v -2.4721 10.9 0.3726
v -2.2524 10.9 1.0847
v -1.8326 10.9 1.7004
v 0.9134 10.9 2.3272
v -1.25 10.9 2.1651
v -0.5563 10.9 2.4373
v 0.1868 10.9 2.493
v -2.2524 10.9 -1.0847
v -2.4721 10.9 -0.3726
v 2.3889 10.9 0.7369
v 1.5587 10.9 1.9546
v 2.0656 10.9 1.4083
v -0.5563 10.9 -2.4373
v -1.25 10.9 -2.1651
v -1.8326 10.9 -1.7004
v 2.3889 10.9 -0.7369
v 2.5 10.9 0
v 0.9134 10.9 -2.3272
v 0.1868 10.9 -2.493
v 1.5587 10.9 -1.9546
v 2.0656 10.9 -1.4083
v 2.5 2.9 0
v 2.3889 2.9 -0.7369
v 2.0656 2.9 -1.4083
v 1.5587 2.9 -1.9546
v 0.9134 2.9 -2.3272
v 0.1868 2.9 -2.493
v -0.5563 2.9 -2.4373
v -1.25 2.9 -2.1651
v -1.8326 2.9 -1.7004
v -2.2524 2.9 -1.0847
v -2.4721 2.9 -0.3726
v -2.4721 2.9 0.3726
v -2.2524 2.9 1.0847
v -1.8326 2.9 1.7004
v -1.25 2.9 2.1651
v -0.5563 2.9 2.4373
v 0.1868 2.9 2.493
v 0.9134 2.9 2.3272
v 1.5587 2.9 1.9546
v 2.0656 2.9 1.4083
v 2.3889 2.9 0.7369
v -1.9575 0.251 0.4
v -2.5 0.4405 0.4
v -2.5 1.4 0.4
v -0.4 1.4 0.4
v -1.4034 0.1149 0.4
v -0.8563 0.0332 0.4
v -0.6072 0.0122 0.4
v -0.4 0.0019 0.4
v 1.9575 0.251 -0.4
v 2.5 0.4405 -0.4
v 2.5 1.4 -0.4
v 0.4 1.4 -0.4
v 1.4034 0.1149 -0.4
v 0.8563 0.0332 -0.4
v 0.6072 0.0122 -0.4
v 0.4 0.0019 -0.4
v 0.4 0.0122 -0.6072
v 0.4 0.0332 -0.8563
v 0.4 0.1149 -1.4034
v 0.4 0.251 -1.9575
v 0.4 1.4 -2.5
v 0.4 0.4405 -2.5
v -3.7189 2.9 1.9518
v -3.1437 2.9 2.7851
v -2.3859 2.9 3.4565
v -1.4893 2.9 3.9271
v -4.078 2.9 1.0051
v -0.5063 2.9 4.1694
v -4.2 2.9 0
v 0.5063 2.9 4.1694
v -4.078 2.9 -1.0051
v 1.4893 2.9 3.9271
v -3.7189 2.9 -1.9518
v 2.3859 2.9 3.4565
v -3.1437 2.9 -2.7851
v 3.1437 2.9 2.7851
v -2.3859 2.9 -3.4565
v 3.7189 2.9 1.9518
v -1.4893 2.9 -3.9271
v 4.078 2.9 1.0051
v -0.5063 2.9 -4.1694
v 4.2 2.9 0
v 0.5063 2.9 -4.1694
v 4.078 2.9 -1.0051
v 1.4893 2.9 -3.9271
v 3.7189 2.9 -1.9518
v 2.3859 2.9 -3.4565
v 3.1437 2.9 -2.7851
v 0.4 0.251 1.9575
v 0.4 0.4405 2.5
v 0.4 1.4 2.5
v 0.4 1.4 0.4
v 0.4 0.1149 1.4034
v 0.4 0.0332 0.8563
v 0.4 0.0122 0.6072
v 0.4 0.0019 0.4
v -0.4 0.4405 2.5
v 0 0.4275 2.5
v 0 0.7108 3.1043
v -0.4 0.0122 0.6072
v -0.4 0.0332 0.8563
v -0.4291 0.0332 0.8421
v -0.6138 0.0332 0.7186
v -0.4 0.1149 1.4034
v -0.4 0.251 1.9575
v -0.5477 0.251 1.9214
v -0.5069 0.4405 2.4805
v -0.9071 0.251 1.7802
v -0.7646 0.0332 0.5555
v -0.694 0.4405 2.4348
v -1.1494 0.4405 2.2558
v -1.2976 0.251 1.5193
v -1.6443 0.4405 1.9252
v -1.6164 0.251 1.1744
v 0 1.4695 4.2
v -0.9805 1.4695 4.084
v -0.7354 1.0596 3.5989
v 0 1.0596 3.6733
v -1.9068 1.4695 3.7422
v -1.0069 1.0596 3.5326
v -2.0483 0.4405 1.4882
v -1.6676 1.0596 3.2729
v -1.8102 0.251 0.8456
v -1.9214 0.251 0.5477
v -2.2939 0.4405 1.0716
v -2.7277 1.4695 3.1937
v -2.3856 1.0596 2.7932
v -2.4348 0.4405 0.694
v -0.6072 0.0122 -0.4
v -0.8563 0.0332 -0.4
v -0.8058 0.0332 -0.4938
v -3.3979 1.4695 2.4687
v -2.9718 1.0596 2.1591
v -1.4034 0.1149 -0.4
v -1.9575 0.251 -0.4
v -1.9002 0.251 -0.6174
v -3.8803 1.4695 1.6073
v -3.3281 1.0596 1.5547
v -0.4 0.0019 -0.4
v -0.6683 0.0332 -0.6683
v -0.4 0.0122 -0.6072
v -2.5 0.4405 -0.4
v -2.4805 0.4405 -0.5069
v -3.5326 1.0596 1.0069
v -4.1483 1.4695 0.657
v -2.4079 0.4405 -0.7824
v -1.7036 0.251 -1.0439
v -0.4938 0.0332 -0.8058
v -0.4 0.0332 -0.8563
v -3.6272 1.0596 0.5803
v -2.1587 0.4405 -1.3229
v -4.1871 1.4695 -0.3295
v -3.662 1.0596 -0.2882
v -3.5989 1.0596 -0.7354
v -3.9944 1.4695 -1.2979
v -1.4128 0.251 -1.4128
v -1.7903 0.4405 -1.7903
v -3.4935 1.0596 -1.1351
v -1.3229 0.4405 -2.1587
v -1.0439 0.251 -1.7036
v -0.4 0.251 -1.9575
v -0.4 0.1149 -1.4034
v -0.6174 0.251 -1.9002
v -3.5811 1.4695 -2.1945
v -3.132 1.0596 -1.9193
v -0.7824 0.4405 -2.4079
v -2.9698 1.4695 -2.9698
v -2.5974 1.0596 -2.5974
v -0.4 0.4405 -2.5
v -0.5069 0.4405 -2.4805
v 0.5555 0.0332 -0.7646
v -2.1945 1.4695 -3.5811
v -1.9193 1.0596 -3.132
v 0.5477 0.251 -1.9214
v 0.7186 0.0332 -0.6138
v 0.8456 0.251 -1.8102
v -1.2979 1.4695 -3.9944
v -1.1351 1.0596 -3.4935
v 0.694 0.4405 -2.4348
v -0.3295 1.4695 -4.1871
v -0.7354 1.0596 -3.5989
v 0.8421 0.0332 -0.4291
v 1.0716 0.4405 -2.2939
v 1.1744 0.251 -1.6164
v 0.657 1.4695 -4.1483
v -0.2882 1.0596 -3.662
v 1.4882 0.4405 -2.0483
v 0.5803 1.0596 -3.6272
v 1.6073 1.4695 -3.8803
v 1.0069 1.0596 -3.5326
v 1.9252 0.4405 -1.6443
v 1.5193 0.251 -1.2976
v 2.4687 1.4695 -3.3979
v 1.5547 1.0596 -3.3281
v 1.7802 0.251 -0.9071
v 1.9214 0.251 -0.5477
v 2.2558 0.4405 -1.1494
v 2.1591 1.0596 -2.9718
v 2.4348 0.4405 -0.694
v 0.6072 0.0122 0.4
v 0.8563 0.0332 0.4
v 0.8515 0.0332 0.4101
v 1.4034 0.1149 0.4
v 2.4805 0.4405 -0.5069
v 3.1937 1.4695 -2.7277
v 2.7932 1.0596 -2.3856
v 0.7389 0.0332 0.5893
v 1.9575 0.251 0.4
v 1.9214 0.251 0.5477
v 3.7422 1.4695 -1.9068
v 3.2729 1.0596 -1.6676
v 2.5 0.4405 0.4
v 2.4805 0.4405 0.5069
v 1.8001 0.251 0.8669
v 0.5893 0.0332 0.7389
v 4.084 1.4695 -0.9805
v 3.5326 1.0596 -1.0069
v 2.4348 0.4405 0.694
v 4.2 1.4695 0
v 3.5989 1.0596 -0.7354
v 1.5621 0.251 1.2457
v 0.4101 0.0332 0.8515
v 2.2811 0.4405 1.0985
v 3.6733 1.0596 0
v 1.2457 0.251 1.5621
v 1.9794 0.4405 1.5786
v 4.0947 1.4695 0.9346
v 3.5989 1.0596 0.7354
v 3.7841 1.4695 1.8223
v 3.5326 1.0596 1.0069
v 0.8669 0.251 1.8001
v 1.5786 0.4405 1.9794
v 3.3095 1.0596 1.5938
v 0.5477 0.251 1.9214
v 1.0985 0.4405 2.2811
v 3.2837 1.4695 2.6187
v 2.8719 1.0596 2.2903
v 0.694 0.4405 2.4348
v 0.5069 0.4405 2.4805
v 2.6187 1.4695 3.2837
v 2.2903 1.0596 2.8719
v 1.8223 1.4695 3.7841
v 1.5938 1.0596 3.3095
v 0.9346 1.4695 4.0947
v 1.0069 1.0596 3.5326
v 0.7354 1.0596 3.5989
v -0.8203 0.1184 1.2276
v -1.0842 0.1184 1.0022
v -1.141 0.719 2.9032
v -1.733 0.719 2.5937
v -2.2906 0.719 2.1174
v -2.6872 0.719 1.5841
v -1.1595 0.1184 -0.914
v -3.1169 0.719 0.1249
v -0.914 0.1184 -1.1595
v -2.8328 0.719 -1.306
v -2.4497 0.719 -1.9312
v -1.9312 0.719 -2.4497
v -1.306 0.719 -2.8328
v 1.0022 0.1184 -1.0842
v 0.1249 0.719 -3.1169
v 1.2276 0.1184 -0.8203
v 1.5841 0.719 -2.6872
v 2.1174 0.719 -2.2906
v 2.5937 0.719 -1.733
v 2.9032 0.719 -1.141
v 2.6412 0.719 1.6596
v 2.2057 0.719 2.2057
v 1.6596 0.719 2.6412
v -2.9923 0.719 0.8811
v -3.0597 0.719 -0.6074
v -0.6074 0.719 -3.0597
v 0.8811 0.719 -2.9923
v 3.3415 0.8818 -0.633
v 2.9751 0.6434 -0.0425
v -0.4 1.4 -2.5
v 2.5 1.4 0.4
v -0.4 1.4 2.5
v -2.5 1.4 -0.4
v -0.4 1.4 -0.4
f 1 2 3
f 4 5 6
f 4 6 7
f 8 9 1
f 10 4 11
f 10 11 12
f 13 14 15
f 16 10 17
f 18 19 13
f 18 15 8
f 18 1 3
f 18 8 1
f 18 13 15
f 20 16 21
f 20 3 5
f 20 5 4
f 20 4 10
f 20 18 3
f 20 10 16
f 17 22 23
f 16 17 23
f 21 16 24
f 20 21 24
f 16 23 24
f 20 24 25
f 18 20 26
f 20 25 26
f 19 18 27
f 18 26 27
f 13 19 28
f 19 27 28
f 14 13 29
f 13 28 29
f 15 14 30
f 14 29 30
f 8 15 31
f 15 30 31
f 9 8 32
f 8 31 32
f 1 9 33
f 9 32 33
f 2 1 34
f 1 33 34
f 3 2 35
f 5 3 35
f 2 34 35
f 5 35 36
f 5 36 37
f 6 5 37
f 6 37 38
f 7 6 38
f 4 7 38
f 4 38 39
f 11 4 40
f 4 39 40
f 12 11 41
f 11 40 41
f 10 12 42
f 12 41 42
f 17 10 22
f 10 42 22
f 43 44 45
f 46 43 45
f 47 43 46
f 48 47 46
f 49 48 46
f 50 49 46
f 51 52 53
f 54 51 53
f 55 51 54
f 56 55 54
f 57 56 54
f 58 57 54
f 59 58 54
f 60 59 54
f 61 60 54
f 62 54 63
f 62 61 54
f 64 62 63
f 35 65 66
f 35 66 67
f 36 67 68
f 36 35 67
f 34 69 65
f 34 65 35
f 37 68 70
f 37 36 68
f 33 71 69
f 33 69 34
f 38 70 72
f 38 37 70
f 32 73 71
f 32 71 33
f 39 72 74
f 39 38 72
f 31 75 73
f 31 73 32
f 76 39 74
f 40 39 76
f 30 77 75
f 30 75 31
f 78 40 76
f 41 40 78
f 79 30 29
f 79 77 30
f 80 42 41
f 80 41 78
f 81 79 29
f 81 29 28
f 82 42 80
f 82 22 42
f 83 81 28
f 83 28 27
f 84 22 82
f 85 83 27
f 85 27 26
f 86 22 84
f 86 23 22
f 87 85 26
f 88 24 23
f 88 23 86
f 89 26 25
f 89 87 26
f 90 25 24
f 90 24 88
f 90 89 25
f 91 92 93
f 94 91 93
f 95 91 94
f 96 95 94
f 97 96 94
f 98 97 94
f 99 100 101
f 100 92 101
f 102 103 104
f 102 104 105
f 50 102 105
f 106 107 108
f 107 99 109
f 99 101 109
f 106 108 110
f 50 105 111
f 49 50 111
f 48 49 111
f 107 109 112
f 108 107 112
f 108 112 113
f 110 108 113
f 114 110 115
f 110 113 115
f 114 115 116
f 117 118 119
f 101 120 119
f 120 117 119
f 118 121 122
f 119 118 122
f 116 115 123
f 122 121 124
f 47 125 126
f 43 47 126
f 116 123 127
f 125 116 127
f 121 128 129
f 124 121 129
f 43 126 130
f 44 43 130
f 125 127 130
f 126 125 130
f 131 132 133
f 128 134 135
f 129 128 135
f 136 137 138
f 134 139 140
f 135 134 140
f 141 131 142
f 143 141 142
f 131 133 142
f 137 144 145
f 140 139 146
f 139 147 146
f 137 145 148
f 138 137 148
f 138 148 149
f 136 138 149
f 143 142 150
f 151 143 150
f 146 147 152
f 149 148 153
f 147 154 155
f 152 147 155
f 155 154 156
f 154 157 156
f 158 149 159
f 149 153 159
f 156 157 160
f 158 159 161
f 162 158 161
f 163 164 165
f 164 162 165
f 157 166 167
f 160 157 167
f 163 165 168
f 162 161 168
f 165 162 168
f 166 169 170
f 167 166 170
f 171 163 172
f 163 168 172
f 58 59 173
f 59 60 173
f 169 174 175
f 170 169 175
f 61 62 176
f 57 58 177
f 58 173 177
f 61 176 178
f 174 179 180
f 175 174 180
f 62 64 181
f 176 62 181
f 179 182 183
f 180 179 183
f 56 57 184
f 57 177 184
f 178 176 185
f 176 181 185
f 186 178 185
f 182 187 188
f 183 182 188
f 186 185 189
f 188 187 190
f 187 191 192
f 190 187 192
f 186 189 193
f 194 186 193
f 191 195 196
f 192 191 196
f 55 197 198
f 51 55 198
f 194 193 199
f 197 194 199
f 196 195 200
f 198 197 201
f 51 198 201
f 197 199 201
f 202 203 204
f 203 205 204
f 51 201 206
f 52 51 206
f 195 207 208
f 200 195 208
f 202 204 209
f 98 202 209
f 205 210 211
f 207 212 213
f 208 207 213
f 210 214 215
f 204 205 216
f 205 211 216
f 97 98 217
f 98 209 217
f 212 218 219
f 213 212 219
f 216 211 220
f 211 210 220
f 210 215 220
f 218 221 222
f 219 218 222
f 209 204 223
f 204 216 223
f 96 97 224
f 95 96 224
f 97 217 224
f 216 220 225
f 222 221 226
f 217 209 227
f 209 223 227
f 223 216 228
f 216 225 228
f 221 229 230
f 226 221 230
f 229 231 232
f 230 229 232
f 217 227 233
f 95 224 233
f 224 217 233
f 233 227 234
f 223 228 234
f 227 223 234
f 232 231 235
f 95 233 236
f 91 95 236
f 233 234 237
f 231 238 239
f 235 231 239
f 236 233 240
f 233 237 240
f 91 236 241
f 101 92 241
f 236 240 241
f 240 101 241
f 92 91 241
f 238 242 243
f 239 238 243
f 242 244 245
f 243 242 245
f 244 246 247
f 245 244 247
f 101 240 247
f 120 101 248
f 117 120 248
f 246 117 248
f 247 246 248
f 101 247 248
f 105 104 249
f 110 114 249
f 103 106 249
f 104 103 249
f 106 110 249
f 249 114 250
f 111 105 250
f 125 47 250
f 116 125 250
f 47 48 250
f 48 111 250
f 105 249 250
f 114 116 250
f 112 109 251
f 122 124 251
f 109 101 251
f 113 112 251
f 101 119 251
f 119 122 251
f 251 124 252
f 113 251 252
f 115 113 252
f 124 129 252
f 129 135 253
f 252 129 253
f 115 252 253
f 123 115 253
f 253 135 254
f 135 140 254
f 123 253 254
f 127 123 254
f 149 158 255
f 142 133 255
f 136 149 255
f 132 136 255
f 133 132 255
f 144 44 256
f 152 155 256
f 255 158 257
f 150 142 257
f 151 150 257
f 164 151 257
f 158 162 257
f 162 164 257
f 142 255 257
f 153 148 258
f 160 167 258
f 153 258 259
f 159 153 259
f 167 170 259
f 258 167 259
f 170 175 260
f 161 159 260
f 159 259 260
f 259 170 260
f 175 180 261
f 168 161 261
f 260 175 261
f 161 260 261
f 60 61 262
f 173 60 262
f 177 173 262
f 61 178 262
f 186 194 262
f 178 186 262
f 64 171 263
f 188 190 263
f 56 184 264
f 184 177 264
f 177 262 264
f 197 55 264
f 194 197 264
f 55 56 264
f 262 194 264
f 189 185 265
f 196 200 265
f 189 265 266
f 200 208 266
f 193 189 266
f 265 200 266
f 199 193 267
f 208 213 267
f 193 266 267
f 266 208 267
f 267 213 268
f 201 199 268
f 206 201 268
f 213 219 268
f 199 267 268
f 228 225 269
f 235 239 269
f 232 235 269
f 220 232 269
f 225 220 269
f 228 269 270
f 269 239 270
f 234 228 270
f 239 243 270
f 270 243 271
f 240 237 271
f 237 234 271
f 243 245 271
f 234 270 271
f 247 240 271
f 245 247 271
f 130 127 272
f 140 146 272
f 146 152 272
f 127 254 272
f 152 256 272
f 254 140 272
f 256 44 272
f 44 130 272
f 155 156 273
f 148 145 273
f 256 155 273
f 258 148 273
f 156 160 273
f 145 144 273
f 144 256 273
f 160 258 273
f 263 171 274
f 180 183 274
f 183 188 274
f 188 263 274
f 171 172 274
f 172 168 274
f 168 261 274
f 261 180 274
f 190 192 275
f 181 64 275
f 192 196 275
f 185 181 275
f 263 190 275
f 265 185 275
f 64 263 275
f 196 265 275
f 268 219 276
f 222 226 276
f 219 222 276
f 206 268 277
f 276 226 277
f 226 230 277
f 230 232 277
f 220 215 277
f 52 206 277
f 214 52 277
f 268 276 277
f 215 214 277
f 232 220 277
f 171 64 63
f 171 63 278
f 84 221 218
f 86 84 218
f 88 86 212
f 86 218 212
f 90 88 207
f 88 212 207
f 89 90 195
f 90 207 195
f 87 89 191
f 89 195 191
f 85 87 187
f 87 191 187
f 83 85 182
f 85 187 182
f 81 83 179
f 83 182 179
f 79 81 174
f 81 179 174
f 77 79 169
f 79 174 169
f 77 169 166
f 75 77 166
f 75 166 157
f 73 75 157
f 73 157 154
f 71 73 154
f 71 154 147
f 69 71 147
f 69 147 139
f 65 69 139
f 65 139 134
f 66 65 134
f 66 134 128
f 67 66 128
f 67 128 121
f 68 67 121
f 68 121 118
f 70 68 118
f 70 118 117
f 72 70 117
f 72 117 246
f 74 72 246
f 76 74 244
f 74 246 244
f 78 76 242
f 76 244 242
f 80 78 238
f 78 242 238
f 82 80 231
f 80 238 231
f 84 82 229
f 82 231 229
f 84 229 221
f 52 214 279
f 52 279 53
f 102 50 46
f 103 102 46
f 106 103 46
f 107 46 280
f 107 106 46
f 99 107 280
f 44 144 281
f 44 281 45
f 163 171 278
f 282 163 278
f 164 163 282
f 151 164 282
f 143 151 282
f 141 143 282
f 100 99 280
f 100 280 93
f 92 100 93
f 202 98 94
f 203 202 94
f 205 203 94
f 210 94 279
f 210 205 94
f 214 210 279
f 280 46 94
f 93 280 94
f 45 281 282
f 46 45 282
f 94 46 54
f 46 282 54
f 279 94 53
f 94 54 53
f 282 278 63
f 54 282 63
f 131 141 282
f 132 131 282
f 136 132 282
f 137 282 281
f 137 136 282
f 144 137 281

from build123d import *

# Parameters (mm, degrees)
SKETCH_1_R          = 4.2
EXTRUDE_1_DEPTH     = 2.9
SKETCH_2_R          = 2.5
EXTRUDE_2_DEPTH     = 8
CUT_EXTRUDE_1_DEPTH = 6.4


with BuildPart() as part:
    # 草图1 → 凸台-拉伸1 (new body)
    with BuildSketch(Plane(origin=(0, 0, 0), x_dir=(1, 0, 0), z_dir=(0, 1, 0))):
        Circle(SKETCH_1_R)
    extrude(amount=EXTRUDE_1_DEPTH)

    # 草图2 → 凸台-拉伸2 (add)
    with BuildSketch(Plane(origin=(0, 2.9, 0), x_dir=(1, 0, 0), z_dir=(0, 1, 0))):
        Circle(SKETCH_2_R)
    extrude(amount=EXTRUDE_2_DEPTH)

    # 草图3 one side → 切除-旋转1 (revolve, cut)
    with BuildSketch(Plane(origin=(0, 0, 0), x_dir=(0, 0, -1), z_dir=(1, 0, 0))):
        with BuildLine():
            ThreePointArc((0, 0), (-2.24147848, 0.330353936), (-4.2, 1.469455754))
            Line((-4.2, 1.469455754), (-5.100943616, -0.95254451))
            Line((-5.100943616, -0.95254451), (0, -0.95254451))
            Line((0, -0.95254451), (0, 0))
        make_face()
    revolve(axis=Axis((0, 1.035939113, 0), (0, -1, 0)), mode=Mode.SUBTRACT)

    # 草图4 → 切除-拉伸1 (cut)
    with BuildSketch(Plane(origin=(0, -5, 0), x_dir=(1, 0, 0), z_dir=(0, 1, 0))):
        Polygon((0.4, -2.5), (0.4, -0.4), (2.5, -0.4), (2.5, 0.4), (0.4, 0.4), (0.4, 2.5), (-0.4, 2.5), (-0.4, 0.4), (-2.5, 0.4), (-2.5, -0.4), (-0.4, -0.4), (-0.4, -2.5), align=None)
    extrude(amount=CUT_EXTRUDE_1_DEPTH, mode=Mode.SUBTRACT)


solid = part.part
